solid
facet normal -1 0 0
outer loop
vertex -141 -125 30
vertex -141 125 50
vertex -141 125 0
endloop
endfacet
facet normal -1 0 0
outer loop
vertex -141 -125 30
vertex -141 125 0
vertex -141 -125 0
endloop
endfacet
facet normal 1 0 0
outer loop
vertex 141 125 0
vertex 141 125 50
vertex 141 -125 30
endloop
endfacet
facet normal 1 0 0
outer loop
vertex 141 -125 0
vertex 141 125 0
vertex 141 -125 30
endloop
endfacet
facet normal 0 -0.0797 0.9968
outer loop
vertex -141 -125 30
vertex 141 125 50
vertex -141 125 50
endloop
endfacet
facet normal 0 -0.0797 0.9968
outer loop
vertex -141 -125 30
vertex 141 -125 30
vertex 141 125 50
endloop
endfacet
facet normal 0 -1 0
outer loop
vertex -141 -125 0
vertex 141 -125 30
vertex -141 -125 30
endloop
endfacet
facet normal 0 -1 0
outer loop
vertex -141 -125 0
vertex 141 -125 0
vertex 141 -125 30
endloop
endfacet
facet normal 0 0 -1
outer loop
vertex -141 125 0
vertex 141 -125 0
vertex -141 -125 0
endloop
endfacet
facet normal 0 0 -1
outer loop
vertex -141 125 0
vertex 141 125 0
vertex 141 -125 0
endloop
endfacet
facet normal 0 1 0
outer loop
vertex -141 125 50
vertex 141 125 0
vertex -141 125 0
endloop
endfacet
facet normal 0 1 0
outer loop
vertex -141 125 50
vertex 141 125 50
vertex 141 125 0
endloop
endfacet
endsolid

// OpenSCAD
$fn = 100;
translate(v = [0, -125, 0])
{
  rotate(a = [90, 0, 90], v = undef)
  {
    linear_extrude(height = 282, center = true, convexity = undef, twist = undef, slices = undef, scale = 1, $fn = 20)
    {
      polygon(points = [[0, 0], [250, 0], [250, 50], [0, 30]], paths = undef, convexity = 1);
    }
  }
}
